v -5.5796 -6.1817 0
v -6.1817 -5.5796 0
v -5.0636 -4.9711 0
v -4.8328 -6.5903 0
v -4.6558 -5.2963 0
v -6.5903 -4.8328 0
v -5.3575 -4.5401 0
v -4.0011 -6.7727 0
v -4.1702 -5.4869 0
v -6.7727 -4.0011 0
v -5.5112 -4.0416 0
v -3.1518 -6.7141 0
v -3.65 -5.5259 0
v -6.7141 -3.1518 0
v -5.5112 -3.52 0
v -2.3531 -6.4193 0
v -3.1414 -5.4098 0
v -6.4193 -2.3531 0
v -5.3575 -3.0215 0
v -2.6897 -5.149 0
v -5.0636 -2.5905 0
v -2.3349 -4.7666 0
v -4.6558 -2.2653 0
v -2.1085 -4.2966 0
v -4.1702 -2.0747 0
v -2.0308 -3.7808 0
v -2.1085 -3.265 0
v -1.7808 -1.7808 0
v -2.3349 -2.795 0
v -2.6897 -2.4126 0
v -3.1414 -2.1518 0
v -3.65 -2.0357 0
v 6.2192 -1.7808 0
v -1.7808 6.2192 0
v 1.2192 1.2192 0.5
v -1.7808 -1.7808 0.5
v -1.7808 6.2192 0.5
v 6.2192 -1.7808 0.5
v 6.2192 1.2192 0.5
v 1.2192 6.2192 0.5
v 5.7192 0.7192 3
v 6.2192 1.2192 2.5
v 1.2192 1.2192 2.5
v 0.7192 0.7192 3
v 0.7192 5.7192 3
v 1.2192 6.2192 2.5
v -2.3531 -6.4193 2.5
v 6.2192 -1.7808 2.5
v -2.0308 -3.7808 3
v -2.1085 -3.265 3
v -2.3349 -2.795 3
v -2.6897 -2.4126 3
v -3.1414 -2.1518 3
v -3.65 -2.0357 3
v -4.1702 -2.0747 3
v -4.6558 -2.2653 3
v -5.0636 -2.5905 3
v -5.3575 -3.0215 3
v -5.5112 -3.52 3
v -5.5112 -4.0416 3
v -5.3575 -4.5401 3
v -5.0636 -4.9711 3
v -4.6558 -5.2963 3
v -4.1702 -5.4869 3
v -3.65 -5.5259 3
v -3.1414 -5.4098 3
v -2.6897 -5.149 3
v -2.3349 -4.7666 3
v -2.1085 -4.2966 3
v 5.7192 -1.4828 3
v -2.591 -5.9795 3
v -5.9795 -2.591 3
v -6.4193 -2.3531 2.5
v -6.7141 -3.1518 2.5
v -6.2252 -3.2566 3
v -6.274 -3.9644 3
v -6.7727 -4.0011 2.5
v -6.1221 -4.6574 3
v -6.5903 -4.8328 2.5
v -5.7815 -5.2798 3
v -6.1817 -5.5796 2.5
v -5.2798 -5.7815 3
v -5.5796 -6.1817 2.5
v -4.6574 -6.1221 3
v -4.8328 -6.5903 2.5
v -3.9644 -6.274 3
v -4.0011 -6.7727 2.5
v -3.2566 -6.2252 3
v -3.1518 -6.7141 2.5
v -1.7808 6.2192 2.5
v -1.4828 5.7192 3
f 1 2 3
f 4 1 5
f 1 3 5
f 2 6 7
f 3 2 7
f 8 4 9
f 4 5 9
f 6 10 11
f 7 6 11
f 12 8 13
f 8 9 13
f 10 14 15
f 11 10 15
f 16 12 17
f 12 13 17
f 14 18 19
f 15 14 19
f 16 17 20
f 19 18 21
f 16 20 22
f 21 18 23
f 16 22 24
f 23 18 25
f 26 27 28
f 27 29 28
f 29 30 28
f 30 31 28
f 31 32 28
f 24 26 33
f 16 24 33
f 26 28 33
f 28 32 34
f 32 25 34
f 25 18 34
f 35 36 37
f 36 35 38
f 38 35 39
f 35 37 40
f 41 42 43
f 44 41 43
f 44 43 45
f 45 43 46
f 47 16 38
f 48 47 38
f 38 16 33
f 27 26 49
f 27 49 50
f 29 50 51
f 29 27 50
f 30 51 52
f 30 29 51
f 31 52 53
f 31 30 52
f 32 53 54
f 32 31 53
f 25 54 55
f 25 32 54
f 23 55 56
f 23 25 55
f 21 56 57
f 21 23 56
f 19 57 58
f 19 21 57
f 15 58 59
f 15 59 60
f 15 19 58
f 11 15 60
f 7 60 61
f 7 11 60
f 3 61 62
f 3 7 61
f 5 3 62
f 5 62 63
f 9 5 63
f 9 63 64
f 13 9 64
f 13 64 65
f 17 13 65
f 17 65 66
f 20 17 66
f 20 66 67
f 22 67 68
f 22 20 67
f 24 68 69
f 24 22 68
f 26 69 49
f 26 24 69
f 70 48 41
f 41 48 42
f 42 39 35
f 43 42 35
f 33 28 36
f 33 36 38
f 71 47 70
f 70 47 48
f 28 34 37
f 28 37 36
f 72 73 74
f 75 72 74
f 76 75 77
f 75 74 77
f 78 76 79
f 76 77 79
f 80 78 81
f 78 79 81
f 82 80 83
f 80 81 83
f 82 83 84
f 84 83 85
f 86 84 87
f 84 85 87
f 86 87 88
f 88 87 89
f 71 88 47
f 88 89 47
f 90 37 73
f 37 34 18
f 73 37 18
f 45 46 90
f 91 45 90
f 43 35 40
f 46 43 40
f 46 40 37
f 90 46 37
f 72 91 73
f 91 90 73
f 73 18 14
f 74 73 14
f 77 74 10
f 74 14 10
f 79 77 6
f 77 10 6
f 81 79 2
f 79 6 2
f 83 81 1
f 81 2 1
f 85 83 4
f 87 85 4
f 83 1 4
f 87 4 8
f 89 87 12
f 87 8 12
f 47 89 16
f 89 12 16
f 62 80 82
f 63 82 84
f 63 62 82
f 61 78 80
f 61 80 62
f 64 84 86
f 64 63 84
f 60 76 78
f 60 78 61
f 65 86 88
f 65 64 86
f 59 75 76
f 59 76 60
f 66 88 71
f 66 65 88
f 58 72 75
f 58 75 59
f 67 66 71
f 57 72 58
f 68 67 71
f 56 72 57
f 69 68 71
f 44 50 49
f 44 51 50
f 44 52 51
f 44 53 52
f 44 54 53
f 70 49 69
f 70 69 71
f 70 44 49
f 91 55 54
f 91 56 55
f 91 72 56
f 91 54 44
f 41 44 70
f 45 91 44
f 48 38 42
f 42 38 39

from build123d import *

# Parameters (mm, degrees)
F0_R     = 1.75
F1_DEPTH = 3
F2_DEPTH = 0.5
F3_SIZE  = 0.5
F4_SIZE  = 0.5


with BuildPart() as f1:
    # F0 (on Top) → F1 (new body)
    with BuildSketch(Plane.XY):
        Polygon((6.219204, 1.219204), (1.219204, 1.219204), (1.219204, 6.219204), (-1.780796, 6.219204), (-1.780796, -1.780796), (6.219204, -1.780796), align=None)
        with BuildLine():
            Line((-1.780796, -1.780796), (-1.780796, 6.219204))
            Line((-1.780796, 6.219204), (-6.419294, -2.353096))
            ThreePointArc((-6.419294, -2.353096), (-5.902116, -5.902116), (-2.353096, -6.419294))
            Line((-2.353096, -6.419294), (6.219204, -1.780796))
            Line((6.219204, -1.780796), (-1.780796, -1.780796))
        make_face()
        with Locations((-3.780796, -3.780796)):
            Circle(F0_R, mode=Mode.SUBTRACT)
    extrude(amount=F1_DEPTH)

    # F0 (on Top) → F2 (cut)
    with BuildSketch(Plane.XY):
        Polygon((6.219204, 1.219204), (1.219204, 1.219204), (1.219204, 6.219204), (-1.780796, 6.219204), (-1.780796, -1.780796), (6.219204, -1.780796), align=None)
    extrude(amount=F2_DEPTH, mode=Mode.SUBTRACT)

    # F3
    f3_edges = [f1.edges().sort_by_distance(p)[0] for p in [
        (1.933054, -4.100045, 3),
        (-5.902116, -5.902116, 3),
        (-4.100045, 1.933054, 3),
    ]]
    chamfer(f3_edges, length=F3_SIZE)

    # F4
    f4_edges = [f1.edges().sort_by_distance(p)[0] for p in [
        (6.219204, 0.003457, 3),
        (3.719204, 1.219204, 3),
        (1.219204, 3.719204, 3),
        (0.003457, 6.219204, 3),
    ]]
    chamfer(f4_edges, length=F4_SIZE)


solid = f1.part
